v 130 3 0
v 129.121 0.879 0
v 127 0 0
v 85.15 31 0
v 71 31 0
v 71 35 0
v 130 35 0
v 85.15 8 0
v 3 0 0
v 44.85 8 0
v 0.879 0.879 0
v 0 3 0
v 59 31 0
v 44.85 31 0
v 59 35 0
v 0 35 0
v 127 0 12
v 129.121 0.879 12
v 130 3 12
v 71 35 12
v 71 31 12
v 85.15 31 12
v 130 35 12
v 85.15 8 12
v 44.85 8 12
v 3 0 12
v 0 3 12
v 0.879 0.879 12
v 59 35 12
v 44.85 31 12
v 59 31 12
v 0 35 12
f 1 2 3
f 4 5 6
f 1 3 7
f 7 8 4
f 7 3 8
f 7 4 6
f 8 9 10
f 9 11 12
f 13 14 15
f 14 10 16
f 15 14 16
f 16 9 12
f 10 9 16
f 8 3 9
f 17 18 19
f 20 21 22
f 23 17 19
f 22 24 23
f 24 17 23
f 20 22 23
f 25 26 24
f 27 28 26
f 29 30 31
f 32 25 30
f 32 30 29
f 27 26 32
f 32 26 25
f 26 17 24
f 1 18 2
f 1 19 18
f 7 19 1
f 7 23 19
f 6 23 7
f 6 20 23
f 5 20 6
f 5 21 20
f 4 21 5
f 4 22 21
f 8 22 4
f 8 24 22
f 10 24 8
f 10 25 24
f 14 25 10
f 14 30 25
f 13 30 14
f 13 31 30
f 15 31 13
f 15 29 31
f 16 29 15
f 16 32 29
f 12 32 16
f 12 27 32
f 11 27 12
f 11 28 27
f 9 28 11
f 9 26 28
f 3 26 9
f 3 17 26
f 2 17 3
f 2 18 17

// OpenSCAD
$fn = 32;

// ----------------------------------------------------------------------
// Window plate: 130 x 35 mm, 1 open windows
// ----------------------------------------------------------------------

// --- parameters (mm) ---
profile_height = 12;      // extrusion height
profile_points = 16;      // points of the closed outline

profile = [[0, 3], [0.879, 0.879], [3, 0], [127, 0], [129.121, 0.879], [130, 3], [130, 35], [71, 35], [71, 31], [85.15, 31], [85.15, 8], [44.85, 8], [44.85, 31], [59, 31], [59, 35], [0, 35]];  // single closed polygon, 16 points, counter clockwise

// --- the one profile operation ---
linear_extrude(height = profile_height) polygon(points = profile);
